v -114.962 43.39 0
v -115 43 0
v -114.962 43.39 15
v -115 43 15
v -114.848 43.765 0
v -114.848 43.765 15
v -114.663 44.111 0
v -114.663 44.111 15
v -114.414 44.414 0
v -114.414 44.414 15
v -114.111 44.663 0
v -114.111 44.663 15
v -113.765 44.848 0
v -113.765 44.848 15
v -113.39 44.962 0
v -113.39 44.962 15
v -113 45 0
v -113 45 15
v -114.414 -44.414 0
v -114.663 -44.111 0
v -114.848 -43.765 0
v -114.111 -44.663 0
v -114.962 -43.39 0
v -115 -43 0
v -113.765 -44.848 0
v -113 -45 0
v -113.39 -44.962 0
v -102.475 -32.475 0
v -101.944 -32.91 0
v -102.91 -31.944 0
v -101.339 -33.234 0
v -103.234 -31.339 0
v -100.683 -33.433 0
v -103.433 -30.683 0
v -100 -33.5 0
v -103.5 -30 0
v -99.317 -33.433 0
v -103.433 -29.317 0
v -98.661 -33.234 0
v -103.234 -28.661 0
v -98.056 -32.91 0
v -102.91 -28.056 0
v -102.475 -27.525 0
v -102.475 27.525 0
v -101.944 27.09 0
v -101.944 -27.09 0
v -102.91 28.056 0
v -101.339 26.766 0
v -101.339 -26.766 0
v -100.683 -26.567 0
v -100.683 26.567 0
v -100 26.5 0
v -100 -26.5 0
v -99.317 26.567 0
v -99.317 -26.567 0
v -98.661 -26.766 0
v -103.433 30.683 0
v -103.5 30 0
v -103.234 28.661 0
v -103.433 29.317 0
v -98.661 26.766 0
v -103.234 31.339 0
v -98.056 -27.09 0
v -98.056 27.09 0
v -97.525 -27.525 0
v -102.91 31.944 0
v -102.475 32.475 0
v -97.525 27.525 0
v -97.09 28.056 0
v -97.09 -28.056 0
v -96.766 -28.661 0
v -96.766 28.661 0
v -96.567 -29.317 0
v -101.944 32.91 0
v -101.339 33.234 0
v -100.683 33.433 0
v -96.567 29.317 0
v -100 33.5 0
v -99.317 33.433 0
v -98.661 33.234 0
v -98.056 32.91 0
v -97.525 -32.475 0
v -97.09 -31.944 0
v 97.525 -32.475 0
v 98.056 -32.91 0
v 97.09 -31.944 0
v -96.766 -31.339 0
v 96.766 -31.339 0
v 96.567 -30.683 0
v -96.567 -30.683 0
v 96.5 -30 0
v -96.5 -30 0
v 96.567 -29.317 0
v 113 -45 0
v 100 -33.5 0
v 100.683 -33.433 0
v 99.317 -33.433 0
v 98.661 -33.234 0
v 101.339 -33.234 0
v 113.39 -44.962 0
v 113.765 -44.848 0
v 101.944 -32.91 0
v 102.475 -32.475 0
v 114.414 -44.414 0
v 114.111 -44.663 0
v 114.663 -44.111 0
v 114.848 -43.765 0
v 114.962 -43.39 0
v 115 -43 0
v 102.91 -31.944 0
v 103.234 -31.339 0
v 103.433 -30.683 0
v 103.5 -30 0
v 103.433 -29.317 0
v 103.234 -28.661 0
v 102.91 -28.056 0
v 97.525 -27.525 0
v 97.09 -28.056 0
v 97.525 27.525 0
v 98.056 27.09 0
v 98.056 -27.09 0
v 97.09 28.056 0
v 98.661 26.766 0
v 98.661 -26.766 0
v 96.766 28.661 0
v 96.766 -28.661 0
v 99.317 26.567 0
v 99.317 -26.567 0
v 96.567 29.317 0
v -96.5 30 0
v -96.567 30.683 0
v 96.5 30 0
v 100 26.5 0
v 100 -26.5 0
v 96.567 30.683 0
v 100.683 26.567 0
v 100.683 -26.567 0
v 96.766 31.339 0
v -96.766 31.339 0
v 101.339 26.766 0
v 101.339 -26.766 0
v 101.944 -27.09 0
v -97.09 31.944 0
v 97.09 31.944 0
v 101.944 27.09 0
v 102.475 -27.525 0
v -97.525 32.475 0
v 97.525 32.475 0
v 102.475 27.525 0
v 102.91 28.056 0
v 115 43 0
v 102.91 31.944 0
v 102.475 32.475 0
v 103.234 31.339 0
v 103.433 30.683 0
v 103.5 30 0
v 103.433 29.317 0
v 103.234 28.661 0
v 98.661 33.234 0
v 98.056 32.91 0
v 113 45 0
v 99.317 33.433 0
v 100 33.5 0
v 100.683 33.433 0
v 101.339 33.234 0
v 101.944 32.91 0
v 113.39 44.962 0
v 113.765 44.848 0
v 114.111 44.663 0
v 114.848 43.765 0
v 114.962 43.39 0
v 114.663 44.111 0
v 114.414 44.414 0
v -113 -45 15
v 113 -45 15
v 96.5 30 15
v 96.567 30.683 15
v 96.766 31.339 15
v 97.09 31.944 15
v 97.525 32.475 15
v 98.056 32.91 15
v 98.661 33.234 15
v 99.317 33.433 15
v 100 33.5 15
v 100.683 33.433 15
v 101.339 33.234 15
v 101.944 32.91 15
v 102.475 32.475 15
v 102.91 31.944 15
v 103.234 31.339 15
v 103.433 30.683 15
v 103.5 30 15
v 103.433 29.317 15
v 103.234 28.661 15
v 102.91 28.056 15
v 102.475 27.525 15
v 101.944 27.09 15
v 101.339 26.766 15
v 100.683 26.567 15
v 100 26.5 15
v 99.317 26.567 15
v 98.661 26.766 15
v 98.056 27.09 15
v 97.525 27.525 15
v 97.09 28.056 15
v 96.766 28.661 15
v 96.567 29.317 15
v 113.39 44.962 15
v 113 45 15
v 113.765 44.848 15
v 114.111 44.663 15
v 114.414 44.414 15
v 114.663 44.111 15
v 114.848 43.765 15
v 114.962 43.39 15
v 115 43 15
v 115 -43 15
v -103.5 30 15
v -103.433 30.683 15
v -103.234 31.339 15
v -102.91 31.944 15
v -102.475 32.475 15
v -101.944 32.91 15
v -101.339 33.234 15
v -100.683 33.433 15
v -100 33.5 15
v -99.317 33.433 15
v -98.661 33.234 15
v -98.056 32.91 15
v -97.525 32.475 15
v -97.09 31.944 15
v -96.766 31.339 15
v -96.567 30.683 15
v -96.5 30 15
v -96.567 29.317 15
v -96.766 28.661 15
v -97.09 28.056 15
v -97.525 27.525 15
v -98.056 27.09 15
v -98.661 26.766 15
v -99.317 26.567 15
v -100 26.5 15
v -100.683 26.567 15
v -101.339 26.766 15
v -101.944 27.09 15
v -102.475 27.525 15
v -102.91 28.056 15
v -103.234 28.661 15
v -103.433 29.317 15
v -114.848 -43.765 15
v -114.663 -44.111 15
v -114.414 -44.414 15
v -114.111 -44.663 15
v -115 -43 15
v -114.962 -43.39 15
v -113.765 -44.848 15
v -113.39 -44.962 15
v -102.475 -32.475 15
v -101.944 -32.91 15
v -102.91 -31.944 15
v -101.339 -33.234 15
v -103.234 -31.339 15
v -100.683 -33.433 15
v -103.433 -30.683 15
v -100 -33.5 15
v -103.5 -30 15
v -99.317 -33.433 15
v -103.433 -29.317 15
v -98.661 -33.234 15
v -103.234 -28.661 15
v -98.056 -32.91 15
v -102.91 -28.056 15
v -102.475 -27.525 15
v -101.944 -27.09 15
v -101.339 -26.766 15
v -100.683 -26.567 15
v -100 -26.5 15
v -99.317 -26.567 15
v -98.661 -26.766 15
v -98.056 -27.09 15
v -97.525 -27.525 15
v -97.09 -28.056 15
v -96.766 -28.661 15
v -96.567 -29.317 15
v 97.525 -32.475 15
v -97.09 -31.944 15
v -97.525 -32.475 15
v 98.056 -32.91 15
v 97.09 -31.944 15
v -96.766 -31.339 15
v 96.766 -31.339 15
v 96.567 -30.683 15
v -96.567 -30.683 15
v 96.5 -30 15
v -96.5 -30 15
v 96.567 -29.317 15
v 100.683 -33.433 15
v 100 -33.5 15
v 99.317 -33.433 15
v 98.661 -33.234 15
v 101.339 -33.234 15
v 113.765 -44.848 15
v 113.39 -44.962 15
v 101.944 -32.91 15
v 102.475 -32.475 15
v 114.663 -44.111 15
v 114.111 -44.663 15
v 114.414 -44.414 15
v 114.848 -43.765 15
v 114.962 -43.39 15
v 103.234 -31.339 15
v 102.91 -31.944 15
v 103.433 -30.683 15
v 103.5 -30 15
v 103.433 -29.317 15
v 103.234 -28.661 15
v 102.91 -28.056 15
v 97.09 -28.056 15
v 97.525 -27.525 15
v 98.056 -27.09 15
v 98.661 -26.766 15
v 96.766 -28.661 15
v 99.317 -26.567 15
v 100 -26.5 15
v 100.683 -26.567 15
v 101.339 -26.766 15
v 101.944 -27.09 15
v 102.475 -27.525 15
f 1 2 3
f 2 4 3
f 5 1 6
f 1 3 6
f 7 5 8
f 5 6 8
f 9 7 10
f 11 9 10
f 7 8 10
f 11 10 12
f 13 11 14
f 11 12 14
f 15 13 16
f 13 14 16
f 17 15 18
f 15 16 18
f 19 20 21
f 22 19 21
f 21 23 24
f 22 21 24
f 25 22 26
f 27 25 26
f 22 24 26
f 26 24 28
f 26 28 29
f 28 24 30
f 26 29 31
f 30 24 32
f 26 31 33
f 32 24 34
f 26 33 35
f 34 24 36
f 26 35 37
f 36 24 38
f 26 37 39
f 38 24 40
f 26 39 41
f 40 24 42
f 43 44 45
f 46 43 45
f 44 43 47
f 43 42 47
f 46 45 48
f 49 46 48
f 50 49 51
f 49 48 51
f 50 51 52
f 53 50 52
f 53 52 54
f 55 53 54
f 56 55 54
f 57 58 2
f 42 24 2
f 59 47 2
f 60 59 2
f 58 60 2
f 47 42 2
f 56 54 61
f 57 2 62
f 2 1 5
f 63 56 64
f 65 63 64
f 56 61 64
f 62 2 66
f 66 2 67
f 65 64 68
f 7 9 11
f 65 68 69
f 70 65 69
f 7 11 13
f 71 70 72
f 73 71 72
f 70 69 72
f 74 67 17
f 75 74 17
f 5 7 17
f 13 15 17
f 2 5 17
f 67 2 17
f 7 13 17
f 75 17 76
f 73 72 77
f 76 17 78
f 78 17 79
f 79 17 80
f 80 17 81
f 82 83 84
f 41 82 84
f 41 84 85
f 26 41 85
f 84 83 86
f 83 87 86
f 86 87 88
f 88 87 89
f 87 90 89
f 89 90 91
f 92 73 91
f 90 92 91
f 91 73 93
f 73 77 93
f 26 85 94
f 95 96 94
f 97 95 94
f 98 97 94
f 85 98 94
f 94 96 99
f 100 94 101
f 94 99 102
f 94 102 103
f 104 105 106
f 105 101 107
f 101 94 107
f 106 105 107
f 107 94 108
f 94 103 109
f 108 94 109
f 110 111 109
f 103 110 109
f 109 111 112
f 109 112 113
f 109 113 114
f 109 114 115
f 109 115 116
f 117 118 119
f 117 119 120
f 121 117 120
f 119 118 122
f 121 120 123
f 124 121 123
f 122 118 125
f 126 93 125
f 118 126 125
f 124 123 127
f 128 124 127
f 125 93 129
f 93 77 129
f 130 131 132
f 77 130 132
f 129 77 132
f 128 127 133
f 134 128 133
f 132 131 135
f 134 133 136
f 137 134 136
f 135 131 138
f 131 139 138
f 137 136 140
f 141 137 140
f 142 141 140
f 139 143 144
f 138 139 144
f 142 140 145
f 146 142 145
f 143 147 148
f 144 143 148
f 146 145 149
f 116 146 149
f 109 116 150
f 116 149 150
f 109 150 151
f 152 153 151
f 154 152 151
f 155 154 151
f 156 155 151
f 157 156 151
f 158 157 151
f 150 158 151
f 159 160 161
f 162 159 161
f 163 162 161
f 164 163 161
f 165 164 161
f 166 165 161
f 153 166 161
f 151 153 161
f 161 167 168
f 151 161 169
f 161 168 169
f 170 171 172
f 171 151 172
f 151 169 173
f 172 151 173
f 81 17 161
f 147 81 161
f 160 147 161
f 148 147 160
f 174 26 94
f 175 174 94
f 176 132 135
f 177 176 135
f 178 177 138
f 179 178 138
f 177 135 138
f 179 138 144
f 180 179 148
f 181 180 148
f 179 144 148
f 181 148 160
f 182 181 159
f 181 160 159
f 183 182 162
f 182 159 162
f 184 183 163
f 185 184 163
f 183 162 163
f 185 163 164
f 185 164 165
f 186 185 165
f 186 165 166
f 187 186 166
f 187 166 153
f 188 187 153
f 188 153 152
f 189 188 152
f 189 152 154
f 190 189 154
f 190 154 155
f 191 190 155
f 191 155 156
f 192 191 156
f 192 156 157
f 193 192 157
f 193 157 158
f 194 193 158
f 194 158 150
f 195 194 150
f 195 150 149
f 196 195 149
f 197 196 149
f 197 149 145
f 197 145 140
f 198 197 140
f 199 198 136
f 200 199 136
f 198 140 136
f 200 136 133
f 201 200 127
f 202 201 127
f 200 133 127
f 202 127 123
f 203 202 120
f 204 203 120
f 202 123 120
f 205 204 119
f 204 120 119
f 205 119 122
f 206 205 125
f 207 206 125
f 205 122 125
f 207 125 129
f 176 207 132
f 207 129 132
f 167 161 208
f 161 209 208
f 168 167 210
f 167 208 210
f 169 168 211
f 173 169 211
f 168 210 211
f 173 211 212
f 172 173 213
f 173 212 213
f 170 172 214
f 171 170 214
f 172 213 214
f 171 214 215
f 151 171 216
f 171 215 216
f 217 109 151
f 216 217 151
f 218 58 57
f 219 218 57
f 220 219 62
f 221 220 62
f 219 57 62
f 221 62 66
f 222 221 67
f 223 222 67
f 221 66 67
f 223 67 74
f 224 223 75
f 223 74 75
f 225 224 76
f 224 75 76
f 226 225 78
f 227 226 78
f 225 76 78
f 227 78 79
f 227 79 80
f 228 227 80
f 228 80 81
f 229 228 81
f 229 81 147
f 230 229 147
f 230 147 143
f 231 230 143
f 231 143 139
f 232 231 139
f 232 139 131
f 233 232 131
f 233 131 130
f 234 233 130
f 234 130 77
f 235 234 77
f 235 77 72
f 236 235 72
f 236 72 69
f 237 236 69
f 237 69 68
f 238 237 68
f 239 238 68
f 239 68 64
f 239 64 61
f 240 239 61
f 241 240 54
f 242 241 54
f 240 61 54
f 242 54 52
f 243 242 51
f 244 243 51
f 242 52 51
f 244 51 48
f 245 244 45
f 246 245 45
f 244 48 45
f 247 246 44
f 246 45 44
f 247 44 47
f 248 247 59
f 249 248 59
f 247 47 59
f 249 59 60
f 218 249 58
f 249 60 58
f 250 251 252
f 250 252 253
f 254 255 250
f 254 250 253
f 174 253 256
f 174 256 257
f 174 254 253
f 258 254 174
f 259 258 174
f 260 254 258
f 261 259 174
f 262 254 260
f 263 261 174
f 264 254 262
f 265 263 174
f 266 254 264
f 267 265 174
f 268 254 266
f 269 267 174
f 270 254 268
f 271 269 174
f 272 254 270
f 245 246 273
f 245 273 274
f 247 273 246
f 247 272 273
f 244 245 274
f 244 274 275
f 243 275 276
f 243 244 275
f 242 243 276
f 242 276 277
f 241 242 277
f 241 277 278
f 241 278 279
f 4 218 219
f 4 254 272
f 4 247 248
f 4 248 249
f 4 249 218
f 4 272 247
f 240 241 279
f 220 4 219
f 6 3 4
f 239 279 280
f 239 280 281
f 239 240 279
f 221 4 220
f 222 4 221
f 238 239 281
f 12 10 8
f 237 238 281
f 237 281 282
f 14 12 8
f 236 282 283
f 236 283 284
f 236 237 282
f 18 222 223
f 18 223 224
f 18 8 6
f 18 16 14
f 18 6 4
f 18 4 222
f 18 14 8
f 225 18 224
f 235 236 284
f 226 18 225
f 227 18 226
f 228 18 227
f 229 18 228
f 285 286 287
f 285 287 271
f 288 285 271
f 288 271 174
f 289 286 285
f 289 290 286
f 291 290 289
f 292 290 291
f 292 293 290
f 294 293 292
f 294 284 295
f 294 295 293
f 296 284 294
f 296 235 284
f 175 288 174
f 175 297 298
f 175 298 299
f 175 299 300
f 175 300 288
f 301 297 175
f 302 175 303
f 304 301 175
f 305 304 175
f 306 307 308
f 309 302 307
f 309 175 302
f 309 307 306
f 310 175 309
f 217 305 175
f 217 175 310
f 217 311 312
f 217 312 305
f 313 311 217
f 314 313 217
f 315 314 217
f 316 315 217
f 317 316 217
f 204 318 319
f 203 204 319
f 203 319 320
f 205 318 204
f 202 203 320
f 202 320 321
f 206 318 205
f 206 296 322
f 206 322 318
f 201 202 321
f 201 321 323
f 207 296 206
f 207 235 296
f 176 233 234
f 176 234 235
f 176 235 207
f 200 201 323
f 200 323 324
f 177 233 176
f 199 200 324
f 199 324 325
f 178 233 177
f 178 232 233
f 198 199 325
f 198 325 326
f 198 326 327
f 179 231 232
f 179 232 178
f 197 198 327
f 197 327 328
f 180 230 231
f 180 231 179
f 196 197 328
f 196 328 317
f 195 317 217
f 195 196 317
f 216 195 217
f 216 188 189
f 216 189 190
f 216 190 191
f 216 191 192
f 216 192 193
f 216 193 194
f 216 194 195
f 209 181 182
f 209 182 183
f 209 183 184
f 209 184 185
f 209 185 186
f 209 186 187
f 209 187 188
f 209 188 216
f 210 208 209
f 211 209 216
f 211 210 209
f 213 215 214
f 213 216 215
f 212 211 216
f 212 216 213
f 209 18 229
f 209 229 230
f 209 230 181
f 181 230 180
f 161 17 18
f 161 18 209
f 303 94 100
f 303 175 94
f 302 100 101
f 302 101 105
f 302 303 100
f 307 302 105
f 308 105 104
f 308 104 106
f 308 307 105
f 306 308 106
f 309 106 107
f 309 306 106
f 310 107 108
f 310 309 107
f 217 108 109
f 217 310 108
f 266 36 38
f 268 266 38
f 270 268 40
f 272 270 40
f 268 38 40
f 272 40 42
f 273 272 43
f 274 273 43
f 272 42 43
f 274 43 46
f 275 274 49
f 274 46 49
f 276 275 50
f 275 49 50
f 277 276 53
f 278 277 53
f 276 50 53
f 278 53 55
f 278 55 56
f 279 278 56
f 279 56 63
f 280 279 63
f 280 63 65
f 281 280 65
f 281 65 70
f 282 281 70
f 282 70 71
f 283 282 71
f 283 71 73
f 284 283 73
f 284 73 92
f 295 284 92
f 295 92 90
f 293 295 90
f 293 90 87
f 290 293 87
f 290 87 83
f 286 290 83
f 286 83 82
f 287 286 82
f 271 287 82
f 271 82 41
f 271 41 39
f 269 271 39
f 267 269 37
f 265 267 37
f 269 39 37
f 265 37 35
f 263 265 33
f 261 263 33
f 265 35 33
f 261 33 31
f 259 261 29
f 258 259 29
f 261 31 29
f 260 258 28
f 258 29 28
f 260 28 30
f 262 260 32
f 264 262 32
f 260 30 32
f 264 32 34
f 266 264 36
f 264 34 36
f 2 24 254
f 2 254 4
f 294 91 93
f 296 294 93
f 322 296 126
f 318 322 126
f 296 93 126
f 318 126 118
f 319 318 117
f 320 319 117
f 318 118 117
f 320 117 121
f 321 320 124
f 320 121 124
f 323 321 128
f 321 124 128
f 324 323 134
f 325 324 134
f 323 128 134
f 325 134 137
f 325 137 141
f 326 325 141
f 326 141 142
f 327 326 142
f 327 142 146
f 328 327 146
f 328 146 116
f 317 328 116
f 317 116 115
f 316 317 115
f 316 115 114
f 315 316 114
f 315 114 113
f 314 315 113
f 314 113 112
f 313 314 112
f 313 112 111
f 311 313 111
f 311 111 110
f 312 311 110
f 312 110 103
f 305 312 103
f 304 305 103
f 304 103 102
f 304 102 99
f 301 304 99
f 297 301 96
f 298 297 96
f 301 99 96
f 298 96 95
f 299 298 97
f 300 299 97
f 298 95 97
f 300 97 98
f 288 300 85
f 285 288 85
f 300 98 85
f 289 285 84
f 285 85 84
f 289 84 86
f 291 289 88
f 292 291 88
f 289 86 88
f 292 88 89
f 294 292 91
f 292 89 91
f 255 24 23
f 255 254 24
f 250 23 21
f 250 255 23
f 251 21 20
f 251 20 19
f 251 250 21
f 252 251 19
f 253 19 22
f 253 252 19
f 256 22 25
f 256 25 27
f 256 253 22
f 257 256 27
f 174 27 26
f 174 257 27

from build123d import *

# Parameters (mm, degrees)
SKIZZE1_W                       = 230
SKIZZE1_H                       = 90
AUFSATZ_LINEAR_AUSTRAGEN1_DEPTH = 15
F_7_0_7_DURCHMESSER_BOHRUNG1_D  = 7
VERRUNDUNG3_R                   = 2
VERRUNDUNG4_R                   = 2


with BuildPart() as part:
    # Skizze1 → Aufsatz-Linear austragen1 (new body)
    with BuildSketch(Plane.XY):
        Rectangle(SKIZZE1_W, SKIZZE1_H)
    extrude(amount=AUFSATZ_LINEAR_AUSTRAGEN1_DEPTH)

    # Ø7.0 (7) Durchmesser Bohrung1 (through all)
    with Locations(Plane.XY.offset(15)):
        with Locations((100, -30), (-100, -30), (-100, 30), (100, 30)):
            Hole(F_7_0_7_DURCHMESSER_BOHRUNG1_D / 2)

    # Verrundung3
    verrundung3_edges = [part.edges().sort_by_distance(p)[0] for p in [
        (-115, 45, 7.5),
        (115, 45, 7.5),
    ]]
    fillet(verrundung3_edges, radius=VERRUNDUNG3_R)

    # Verrundung4
    verrundung4_edges = [part.edges().sort_by_distance(p)[0] for p in [
        (115, -45, 7.5),
        (-115, -45, 7.5),
    ]]
    fillet(verrundung4_edges, radius=VERRUNDUNG4_R)


solid = part.part
